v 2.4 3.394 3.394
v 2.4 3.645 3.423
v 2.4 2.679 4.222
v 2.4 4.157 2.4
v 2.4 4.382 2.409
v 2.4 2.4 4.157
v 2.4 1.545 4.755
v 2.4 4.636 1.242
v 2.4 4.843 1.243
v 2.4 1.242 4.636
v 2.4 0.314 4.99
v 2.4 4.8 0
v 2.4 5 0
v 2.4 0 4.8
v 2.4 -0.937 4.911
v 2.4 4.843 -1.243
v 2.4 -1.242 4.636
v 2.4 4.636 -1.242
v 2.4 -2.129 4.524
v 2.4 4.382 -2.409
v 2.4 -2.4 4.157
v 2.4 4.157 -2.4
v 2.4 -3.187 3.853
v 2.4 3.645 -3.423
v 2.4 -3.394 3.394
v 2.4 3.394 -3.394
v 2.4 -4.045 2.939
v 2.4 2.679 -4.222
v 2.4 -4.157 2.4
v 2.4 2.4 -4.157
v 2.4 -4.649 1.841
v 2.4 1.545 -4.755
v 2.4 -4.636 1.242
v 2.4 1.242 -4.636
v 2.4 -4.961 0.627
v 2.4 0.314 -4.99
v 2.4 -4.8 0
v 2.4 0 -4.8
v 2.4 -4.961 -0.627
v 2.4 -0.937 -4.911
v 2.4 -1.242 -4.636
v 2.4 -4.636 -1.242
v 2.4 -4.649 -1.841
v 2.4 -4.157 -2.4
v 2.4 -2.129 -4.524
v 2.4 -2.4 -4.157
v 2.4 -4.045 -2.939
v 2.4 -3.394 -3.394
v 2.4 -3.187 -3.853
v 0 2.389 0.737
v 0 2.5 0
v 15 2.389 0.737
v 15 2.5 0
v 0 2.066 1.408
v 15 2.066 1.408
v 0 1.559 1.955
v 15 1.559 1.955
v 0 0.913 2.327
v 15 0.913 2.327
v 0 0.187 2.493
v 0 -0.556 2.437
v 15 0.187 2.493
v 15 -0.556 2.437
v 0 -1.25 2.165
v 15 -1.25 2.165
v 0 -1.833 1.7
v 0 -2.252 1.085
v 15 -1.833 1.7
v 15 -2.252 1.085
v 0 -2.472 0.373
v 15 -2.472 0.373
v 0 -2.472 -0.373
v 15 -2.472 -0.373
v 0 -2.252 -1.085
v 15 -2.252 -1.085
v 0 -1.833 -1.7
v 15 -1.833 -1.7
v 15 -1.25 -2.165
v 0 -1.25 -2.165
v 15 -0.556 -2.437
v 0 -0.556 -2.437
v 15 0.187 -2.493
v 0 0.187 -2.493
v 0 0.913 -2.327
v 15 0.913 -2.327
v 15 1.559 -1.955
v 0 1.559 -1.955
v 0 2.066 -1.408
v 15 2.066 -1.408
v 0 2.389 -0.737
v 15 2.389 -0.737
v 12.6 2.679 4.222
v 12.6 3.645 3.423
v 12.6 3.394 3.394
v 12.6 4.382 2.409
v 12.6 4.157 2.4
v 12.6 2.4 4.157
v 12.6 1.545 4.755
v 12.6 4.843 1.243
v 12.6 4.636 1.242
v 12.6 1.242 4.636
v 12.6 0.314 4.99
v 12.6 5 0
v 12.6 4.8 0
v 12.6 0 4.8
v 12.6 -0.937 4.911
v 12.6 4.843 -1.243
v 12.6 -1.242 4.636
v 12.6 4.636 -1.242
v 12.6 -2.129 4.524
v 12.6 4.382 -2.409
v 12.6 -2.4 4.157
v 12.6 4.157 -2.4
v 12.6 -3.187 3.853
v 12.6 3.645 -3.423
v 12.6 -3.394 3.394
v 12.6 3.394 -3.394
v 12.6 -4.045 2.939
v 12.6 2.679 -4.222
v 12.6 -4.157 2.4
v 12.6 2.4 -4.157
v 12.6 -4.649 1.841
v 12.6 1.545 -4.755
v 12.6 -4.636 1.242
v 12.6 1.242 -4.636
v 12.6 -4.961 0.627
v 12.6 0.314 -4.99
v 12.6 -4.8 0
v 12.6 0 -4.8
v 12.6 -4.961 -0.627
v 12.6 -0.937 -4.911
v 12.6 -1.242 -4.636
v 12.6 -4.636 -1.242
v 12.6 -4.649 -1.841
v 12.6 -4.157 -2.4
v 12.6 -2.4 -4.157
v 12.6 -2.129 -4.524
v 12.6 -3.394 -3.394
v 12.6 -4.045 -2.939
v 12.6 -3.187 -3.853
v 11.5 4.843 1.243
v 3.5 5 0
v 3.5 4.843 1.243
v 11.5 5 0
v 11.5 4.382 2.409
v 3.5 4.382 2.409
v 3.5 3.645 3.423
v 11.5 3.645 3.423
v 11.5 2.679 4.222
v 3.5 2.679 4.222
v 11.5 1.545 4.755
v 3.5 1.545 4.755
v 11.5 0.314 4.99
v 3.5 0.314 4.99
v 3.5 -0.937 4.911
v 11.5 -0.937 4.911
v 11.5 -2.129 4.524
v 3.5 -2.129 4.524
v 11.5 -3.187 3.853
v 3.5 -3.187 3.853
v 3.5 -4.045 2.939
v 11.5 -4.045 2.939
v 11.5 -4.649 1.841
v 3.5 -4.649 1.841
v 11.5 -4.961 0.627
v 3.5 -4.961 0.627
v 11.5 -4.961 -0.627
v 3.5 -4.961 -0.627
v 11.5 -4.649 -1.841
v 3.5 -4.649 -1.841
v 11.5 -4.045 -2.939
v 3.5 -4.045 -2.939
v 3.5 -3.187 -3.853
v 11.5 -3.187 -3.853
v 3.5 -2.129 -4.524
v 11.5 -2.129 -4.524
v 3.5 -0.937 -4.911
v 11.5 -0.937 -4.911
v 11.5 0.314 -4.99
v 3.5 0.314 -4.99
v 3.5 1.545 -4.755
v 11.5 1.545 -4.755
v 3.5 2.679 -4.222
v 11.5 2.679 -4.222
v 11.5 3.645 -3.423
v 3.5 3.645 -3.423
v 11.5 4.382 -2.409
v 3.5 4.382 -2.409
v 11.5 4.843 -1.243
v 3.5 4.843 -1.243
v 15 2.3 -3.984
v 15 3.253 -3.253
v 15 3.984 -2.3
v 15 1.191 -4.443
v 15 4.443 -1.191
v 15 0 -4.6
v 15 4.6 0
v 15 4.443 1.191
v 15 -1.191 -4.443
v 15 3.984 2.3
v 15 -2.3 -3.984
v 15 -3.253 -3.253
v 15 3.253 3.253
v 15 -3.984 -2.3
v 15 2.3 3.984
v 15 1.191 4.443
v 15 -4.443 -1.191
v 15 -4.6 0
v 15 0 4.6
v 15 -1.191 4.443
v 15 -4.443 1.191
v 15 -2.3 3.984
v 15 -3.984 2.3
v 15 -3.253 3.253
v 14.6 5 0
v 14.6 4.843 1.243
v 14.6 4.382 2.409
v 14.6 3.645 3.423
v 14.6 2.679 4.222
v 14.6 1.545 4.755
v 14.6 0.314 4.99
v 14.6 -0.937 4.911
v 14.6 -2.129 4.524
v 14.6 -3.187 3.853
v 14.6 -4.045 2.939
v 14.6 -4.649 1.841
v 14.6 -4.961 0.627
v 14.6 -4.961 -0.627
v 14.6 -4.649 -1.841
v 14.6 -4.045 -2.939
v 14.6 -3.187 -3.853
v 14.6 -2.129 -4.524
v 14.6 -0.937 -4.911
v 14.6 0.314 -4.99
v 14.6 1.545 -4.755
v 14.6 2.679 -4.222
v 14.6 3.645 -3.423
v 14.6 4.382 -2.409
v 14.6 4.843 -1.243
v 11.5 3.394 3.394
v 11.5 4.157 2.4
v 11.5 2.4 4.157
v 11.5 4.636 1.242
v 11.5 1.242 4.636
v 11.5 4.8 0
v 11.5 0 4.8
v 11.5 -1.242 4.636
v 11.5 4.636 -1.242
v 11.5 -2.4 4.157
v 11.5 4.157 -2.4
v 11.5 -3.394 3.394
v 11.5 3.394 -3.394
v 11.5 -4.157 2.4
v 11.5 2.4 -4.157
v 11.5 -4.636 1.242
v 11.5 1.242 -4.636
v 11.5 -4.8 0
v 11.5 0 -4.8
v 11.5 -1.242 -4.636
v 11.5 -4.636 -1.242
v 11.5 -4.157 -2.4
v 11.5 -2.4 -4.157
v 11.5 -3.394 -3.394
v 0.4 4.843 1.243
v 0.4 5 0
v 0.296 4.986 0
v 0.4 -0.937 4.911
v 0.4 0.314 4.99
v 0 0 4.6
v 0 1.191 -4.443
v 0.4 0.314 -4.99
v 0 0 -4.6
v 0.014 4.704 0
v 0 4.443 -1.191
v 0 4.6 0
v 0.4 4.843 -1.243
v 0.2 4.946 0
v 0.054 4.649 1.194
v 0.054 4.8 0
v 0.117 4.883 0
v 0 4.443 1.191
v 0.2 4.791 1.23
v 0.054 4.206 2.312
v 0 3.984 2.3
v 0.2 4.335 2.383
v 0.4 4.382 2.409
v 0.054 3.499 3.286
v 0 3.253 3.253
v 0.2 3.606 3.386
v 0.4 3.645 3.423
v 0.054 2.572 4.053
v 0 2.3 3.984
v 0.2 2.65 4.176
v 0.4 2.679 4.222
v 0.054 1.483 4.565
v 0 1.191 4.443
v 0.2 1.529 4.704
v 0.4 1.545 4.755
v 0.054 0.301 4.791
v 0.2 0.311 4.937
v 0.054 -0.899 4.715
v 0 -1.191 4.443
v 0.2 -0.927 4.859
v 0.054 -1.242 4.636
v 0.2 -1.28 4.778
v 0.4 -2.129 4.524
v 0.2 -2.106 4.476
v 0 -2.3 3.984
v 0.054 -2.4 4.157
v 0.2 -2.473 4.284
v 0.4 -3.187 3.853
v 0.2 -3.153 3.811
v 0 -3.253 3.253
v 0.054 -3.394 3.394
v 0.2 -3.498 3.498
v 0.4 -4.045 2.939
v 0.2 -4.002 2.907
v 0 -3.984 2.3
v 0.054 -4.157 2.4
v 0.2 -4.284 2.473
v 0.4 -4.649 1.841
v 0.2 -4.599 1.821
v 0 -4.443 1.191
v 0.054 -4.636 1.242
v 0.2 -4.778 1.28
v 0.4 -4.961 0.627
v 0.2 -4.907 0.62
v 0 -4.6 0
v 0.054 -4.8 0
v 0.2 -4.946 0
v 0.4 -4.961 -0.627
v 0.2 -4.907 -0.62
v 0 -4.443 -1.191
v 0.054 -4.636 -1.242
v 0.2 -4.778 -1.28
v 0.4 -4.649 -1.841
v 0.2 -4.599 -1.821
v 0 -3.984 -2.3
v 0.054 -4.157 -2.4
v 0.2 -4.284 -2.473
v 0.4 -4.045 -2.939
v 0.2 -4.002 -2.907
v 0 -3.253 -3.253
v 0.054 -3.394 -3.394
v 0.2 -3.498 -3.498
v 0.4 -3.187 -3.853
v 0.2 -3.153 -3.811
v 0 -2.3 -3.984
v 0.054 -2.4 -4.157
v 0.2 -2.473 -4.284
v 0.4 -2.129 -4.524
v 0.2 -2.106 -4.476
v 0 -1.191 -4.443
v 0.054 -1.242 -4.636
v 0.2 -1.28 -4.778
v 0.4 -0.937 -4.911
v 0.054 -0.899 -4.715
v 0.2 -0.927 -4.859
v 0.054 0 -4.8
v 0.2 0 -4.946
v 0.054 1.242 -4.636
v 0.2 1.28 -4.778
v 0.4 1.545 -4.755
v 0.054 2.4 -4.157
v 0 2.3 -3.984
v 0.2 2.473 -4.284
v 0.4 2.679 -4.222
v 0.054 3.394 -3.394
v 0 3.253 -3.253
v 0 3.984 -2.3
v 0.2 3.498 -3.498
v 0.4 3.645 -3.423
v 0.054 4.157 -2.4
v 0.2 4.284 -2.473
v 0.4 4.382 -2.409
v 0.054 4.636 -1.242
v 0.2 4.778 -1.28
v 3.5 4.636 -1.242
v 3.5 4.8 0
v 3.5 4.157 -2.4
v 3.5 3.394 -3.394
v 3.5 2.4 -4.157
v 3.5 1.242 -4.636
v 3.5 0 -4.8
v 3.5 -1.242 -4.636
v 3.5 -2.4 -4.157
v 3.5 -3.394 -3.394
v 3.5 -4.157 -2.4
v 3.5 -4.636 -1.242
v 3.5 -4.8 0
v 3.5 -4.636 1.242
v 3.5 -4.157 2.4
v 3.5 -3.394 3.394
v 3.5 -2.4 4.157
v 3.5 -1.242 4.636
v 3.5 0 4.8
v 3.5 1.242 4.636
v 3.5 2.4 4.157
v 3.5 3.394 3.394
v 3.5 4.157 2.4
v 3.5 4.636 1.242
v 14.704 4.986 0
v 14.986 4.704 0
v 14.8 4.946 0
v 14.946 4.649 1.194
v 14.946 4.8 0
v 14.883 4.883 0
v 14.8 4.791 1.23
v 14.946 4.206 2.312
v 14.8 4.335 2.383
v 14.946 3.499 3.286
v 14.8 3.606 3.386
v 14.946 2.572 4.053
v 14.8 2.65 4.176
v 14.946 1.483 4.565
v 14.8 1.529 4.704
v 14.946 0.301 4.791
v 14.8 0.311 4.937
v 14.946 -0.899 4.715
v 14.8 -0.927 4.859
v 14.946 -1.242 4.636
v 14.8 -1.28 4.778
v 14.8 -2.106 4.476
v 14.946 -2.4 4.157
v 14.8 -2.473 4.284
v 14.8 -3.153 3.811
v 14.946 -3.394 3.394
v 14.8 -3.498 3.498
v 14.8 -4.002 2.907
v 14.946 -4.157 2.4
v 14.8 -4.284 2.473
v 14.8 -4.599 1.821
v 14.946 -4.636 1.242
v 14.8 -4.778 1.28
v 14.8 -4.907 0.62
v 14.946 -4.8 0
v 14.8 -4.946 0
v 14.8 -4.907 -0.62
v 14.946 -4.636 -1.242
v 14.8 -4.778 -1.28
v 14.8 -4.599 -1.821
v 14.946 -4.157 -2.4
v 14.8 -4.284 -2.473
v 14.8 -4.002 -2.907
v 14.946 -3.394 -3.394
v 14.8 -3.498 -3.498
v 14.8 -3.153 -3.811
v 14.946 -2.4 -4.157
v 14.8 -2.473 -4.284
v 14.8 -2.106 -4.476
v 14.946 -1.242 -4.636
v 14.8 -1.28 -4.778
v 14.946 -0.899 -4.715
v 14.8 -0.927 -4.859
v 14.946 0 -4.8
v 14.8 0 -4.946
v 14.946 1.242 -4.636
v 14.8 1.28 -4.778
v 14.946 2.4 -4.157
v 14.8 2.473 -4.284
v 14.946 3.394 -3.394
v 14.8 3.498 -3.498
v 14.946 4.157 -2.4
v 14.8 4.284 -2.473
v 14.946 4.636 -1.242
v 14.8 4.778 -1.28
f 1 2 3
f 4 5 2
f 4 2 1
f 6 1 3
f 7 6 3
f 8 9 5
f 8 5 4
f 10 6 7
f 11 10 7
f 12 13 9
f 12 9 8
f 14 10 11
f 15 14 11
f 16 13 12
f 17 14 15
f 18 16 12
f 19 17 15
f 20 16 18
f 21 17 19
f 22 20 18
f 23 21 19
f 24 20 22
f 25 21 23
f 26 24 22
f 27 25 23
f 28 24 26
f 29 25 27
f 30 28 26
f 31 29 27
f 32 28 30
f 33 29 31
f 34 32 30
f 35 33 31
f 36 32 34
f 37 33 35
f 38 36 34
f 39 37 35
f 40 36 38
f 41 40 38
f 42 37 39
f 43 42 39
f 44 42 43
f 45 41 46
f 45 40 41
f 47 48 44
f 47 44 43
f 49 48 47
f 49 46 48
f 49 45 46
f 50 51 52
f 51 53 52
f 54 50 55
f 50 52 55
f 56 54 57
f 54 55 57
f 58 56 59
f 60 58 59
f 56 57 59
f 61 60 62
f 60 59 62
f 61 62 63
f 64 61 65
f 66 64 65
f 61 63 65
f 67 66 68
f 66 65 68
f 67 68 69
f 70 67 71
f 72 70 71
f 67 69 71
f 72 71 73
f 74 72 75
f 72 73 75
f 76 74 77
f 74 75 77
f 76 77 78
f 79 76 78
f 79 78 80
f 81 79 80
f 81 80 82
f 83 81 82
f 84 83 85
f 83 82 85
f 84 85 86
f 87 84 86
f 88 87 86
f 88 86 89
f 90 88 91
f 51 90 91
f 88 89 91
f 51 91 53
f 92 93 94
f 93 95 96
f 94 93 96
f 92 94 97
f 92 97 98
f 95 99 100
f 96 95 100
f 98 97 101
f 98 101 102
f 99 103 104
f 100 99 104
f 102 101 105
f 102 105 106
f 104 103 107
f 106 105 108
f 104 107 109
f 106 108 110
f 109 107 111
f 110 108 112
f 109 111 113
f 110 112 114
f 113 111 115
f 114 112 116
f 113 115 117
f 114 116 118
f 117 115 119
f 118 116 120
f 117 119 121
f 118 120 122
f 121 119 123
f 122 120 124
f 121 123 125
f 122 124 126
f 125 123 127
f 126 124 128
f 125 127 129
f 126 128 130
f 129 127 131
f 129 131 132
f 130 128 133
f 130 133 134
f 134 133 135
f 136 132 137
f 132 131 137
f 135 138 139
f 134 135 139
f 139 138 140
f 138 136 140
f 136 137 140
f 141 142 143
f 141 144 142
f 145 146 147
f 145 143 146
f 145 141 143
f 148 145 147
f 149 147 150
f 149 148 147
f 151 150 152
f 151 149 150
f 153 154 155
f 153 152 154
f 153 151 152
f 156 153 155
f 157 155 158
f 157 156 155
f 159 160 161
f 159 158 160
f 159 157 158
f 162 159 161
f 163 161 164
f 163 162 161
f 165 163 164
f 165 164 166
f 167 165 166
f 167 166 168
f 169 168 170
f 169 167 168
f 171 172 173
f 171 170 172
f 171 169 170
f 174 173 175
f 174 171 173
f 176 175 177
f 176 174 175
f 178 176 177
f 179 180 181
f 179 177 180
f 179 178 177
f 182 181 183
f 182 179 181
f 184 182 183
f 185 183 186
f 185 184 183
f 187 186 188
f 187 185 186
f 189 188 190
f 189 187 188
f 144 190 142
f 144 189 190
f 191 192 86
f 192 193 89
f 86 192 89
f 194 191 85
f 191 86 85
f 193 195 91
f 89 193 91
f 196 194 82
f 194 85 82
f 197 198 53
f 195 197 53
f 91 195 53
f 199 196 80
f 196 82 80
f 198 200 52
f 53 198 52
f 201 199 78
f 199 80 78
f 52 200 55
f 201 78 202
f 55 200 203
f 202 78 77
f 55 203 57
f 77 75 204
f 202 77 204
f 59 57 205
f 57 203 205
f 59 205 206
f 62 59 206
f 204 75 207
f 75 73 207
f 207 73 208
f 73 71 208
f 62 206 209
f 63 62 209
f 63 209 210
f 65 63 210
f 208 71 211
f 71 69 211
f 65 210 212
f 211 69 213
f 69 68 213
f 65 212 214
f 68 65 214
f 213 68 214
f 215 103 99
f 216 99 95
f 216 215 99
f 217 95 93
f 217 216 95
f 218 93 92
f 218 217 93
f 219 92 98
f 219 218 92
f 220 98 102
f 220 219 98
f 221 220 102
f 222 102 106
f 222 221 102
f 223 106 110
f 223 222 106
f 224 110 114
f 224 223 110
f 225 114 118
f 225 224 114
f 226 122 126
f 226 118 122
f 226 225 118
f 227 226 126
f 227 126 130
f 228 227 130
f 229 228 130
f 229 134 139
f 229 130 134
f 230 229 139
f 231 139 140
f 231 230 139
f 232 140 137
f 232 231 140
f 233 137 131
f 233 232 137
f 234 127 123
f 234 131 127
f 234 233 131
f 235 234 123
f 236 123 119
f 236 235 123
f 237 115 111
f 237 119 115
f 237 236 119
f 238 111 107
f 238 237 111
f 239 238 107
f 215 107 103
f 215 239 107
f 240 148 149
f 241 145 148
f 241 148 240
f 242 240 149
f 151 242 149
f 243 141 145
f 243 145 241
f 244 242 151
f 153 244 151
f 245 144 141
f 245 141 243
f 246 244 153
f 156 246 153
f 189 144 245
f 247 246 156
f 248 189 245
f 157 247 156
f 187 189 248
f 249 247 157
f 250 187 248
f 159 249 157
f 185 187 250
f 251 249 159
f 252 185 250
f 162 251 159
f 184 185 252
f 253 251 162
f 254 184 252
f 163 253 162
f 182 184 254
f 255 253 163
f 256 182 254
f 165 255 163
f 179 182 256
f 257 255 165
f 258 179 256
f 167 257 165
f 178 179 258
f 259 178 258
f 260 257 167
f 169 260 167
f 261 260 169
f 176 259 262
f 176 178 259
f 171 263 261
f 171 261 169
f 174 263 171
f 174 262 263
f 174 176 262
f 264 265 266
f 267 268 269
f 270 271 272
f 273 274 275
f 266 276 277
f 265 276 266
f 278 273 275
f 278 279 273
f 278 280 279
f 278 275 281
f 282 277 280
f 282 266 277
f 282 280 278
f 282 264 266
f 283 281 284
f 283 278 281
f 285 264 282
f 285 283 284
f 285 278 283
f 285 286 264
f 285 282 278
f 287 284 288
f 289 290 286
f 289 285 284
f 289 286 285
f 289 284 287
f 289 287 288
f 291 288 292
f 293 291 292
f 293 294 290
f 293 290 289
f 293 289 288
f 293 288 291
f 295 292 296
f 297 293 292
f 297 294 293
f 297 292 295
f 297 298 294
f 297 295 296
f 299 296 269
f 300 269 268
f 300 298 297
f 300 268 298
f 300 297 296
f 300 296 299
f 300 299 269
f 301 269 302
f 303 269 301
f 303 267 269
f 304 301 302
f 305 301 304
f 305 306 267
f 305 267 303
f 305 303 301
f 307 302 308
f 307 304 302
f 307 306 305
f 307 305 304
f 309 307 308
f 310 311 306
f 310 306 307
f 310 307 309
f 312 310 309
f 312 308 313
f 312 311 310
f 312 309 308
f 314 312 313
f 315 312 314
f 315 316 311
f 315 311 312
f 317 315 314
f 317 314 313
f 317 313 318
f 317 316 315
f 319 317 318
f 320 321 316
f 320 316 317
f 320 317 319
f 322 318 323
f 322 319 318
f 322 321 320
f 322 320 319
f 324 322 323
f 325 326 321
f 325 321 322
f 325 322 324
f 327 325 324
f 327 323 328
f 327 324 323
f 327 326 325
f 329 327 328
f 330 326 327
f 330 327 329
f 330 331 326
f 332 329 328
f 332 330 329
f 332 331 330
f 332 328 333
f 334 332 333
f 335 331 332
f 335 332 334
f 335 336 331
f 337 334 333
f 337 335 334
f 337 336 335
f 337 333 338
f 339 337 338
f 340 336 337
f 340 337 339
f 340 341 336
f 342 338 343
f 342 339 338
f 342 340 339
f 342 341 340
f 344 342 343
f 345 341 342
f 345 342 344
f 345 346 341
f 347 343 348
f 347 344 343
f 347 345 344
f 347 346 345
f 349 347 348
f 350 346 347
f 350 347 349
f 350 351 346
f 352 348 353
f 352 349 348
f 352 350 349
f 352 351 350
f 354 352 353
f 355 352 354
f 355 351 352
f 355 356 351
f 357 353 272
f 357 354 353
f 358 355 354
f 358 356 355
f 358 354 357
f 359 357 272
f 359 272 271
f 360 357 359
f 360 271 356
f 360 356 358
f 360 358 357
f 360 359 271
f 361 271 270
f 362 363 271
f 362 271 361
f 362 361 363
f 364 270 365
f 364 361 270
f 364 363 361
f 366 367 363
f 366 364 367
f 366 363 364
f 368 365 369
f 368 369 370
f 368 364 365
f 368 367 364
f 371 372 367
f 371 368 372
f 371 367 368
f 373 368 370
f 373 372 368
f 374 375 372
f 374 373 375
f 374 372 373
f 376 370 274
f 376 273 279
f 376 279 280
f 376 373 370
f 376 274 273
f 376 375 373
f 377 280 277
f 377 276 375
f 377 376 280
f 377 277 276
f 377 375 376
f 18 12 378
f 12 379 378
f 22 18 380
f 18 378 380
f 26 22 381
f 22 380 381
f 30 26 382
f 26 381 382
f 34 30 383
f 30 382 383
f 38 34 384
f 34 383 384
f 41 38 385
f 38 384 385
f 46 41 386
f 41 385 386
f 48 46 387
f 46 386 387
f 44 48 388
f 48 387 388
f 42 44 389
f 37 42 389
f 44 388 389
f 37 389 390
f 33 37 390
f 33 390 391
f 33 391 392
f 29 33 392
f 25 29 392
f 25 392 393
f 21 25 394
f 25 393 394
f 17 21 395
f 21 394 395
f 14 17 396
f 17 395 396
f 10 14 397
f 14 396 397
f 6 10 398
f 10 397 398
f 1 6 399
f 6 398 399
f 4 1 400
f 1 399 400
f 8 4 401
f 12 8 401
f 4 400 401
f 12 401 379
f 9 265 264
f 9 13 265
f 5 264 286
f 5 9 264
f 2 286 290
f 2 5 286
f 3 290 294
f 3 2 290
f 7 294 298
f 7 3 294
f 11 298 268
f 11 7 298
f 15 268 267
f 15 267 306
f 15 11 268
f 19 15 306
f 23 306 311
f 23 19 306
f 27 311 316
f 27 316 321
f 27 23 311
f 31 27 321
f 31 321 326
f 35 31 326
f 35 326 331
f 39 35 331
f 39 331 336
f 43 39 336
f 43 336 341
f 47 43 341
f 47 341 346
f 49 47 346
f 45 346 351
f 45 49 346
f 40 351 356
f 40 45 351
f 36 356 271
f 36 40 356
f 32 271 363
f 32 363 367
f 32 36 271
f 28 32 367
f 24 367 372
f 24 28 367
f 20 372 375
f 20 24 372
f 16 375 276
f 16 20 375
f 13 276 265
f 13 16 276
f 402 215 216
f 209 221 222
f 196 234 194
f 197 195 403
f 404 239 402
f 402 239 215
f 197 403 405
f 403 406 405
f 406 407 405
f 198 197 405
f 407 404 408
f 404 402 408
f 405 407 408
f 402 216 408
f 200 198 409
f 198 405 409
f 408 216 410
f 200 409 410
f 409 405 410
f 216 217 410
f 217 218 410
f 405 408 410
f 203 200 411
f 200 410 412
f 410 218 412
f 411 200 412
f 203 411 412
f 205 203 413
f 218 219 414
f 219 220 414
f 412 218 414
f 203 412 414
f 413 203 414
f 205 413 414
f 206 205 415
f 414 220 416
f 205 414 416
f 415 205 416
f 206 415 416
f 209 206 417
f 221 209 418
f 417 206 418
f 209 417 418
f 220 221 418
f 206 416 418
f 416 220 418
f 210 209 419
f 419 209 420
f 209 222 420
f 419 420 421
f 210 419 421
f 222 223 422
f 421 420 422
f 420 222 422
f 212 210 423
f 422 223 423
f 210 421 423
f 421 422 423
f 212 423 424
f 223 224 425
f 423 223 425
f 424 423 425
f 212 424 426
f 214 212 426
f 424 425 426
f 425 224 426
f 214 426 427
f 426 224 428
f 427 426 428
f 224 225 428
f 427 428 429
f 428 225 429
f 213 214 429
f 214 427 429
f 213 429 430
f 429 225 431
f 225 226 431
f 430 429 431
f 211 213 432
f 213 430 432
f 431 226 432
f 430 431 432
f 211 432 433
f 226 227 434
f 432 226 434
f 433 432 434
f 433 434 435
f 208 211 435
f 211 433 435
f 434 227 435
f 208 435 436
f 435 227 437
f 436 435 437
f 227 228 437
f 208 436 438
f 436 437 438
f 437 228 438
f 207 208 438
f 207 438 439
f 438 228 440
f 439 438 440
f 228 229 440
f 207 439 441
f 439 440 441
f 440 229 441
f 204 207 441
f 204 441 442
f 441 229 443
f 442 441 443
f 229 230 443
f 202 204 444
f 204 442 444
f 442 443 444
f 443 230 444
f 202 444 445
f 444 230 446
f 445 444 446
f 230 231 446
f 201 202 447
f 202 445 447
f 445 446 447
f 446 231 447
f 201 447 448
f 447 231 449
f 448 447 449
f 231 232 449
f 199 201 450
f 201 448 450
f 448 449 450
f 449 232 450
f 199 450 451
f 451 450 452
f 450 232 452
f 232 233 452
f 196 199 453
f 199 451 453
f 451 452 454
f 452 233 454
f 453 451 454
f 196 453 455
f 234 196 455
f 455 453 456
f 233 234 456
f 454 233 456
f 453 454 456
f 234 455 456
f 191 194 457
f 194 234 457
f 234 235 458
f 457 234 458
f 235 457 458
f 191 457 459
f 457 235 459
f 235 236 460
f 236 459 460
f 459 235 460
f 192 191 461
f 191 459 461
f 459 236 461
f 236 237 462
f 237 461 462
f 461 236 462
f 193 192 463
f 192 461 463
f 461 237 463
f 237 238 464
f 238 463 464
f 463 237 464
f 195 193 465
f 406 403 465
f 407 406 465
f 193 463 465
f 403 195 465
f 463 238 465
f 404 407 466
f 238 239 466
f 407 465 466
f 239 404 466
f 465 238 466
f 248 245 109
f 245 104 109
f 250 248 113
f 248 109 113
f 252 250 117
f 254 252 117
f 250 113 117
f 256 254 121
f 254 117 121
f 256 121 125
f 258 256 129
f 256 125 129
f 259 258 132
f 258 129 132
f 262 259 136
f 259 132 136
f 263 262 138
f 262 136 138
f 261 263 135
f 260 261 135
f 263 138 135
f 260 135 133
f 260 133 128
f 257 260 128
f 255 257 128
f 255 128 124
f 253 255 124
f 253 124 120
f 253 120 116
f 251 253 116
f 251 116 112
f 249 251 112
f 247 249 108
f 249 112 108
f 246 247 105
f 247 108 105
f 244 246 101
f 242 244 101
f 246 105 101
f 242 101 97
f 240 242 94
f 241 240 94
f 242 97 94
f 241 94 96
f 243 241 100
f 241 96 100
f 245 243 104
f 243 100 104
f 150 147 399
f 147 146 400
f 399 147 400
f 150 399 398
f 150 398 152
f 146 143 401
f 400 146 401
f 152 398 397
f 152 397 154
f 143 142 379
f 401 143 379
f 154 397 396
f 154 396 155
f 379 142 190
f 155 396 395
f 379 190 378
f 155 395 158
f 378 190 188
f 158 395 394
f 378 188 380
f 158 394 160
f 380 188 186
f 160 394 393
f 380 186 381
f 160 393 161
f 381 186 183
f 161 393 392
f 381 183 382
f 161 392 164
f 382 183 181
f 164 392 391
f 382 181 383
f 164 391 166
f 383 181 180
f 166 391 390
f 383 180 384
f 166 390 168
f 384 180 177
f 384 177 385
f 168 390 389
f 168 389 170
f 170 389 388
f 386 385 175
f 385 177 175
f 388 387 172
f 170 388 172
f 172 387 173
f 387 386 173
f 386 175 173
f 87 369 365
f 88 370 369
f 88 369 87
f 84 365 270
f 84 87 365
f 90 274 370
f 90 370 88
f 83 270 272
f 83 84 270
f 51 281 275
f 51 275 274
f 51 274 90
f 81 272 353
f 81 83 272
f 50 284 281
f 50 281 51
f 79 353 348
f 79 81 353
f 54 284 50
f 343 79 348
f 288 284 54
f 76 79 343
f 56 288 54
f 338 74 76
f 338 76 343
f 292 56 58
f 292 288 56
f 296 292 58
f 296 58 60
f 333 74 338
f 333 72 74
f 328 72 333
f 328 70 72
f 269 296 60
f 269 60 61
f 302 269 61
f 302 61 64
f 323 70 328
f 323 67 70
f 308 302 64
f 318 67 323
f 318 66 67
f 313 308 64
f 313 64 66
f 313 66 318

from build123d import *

# Parameters (mm, degrees)
SKETCH1_W = 15
SKETCH1_H = 2.5
FILLET1_R = 0.4
SKETCH2_W = 1.1
SKETCH2_H = 0.2


with BuildPart() as part:
    # Sketch1 → Revolve1 (revolve)
    with BuildSketch(Plane.XY):
        with Locations((7.5, 3.75)):
            Rectangle(SKETCH1_W, SKETCH1_H)
    revolve(axis=Axis((0, 0, 0), (1, 0, 0)))

    # Fillet1
    fillet1_edges = [part.edges().sort_by_distance(p)[0] for p in [
        (0, -5, 0),
        (15, -5, 0),
    ]]
    fillet(fillet1_edges, radius=FILLET1_R)

    # Sketch2 → Cut-Revolve1 (revolve, cut)
    with BuildSketch(Plane.XY):
        with Locations((12.05, 4.9)):
            Rectangle(SKETCH2_W, SKETCH2_H)
        with Locations((2.95, 4.9)):
            Rectangle(SKETCH2_W, SKETCH2_H)
    revolve(axis=Axis((15, 0, 0), (-1, 0, 0)), mode=Mode.SUBTRACT)


solid = part.part
